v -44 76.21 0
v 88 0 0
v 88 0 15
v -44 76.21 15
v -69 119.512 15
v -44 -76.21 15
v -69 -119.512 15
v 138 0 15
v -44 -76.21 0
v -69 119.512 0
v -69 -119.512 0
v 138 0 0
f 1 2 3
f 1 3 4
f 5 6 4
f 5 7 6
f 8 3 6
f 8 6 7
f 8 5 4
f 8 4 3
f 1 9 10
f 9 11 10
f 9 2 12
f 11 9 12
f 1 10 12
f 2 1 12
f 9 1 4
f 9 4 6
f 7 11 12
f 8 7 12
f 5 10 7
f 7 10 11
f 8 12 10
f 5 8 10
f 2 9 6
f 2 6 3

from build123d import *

# Parameters (mm, degrees)
PRISM001_DEPTH = 15
PRISM_DEPTH    = 15


with BuildPart() as prism001:
    # Prism001 → Prism001 (new body)
    with BuildSketch(Plane.XY):
        Polygon((88, 0), (-44, 76.210236), (-44, -76.210236), align=None)
    extrude(amount=PRISM001_DEPTH)


with BuildPart() as cut:
    # Prism → Prism (new body)
    with BuildSketch(Plane.XY):
        Polygon((138, 0), (-69, 119.511506), (-69, -119.511506), align=None)
    extrude(amount=PRISM_DEPTH)

    # Cut: cut Prism001
    add(prism001.part, mode=Mode.SUBTRACT)


solid = cut.part
